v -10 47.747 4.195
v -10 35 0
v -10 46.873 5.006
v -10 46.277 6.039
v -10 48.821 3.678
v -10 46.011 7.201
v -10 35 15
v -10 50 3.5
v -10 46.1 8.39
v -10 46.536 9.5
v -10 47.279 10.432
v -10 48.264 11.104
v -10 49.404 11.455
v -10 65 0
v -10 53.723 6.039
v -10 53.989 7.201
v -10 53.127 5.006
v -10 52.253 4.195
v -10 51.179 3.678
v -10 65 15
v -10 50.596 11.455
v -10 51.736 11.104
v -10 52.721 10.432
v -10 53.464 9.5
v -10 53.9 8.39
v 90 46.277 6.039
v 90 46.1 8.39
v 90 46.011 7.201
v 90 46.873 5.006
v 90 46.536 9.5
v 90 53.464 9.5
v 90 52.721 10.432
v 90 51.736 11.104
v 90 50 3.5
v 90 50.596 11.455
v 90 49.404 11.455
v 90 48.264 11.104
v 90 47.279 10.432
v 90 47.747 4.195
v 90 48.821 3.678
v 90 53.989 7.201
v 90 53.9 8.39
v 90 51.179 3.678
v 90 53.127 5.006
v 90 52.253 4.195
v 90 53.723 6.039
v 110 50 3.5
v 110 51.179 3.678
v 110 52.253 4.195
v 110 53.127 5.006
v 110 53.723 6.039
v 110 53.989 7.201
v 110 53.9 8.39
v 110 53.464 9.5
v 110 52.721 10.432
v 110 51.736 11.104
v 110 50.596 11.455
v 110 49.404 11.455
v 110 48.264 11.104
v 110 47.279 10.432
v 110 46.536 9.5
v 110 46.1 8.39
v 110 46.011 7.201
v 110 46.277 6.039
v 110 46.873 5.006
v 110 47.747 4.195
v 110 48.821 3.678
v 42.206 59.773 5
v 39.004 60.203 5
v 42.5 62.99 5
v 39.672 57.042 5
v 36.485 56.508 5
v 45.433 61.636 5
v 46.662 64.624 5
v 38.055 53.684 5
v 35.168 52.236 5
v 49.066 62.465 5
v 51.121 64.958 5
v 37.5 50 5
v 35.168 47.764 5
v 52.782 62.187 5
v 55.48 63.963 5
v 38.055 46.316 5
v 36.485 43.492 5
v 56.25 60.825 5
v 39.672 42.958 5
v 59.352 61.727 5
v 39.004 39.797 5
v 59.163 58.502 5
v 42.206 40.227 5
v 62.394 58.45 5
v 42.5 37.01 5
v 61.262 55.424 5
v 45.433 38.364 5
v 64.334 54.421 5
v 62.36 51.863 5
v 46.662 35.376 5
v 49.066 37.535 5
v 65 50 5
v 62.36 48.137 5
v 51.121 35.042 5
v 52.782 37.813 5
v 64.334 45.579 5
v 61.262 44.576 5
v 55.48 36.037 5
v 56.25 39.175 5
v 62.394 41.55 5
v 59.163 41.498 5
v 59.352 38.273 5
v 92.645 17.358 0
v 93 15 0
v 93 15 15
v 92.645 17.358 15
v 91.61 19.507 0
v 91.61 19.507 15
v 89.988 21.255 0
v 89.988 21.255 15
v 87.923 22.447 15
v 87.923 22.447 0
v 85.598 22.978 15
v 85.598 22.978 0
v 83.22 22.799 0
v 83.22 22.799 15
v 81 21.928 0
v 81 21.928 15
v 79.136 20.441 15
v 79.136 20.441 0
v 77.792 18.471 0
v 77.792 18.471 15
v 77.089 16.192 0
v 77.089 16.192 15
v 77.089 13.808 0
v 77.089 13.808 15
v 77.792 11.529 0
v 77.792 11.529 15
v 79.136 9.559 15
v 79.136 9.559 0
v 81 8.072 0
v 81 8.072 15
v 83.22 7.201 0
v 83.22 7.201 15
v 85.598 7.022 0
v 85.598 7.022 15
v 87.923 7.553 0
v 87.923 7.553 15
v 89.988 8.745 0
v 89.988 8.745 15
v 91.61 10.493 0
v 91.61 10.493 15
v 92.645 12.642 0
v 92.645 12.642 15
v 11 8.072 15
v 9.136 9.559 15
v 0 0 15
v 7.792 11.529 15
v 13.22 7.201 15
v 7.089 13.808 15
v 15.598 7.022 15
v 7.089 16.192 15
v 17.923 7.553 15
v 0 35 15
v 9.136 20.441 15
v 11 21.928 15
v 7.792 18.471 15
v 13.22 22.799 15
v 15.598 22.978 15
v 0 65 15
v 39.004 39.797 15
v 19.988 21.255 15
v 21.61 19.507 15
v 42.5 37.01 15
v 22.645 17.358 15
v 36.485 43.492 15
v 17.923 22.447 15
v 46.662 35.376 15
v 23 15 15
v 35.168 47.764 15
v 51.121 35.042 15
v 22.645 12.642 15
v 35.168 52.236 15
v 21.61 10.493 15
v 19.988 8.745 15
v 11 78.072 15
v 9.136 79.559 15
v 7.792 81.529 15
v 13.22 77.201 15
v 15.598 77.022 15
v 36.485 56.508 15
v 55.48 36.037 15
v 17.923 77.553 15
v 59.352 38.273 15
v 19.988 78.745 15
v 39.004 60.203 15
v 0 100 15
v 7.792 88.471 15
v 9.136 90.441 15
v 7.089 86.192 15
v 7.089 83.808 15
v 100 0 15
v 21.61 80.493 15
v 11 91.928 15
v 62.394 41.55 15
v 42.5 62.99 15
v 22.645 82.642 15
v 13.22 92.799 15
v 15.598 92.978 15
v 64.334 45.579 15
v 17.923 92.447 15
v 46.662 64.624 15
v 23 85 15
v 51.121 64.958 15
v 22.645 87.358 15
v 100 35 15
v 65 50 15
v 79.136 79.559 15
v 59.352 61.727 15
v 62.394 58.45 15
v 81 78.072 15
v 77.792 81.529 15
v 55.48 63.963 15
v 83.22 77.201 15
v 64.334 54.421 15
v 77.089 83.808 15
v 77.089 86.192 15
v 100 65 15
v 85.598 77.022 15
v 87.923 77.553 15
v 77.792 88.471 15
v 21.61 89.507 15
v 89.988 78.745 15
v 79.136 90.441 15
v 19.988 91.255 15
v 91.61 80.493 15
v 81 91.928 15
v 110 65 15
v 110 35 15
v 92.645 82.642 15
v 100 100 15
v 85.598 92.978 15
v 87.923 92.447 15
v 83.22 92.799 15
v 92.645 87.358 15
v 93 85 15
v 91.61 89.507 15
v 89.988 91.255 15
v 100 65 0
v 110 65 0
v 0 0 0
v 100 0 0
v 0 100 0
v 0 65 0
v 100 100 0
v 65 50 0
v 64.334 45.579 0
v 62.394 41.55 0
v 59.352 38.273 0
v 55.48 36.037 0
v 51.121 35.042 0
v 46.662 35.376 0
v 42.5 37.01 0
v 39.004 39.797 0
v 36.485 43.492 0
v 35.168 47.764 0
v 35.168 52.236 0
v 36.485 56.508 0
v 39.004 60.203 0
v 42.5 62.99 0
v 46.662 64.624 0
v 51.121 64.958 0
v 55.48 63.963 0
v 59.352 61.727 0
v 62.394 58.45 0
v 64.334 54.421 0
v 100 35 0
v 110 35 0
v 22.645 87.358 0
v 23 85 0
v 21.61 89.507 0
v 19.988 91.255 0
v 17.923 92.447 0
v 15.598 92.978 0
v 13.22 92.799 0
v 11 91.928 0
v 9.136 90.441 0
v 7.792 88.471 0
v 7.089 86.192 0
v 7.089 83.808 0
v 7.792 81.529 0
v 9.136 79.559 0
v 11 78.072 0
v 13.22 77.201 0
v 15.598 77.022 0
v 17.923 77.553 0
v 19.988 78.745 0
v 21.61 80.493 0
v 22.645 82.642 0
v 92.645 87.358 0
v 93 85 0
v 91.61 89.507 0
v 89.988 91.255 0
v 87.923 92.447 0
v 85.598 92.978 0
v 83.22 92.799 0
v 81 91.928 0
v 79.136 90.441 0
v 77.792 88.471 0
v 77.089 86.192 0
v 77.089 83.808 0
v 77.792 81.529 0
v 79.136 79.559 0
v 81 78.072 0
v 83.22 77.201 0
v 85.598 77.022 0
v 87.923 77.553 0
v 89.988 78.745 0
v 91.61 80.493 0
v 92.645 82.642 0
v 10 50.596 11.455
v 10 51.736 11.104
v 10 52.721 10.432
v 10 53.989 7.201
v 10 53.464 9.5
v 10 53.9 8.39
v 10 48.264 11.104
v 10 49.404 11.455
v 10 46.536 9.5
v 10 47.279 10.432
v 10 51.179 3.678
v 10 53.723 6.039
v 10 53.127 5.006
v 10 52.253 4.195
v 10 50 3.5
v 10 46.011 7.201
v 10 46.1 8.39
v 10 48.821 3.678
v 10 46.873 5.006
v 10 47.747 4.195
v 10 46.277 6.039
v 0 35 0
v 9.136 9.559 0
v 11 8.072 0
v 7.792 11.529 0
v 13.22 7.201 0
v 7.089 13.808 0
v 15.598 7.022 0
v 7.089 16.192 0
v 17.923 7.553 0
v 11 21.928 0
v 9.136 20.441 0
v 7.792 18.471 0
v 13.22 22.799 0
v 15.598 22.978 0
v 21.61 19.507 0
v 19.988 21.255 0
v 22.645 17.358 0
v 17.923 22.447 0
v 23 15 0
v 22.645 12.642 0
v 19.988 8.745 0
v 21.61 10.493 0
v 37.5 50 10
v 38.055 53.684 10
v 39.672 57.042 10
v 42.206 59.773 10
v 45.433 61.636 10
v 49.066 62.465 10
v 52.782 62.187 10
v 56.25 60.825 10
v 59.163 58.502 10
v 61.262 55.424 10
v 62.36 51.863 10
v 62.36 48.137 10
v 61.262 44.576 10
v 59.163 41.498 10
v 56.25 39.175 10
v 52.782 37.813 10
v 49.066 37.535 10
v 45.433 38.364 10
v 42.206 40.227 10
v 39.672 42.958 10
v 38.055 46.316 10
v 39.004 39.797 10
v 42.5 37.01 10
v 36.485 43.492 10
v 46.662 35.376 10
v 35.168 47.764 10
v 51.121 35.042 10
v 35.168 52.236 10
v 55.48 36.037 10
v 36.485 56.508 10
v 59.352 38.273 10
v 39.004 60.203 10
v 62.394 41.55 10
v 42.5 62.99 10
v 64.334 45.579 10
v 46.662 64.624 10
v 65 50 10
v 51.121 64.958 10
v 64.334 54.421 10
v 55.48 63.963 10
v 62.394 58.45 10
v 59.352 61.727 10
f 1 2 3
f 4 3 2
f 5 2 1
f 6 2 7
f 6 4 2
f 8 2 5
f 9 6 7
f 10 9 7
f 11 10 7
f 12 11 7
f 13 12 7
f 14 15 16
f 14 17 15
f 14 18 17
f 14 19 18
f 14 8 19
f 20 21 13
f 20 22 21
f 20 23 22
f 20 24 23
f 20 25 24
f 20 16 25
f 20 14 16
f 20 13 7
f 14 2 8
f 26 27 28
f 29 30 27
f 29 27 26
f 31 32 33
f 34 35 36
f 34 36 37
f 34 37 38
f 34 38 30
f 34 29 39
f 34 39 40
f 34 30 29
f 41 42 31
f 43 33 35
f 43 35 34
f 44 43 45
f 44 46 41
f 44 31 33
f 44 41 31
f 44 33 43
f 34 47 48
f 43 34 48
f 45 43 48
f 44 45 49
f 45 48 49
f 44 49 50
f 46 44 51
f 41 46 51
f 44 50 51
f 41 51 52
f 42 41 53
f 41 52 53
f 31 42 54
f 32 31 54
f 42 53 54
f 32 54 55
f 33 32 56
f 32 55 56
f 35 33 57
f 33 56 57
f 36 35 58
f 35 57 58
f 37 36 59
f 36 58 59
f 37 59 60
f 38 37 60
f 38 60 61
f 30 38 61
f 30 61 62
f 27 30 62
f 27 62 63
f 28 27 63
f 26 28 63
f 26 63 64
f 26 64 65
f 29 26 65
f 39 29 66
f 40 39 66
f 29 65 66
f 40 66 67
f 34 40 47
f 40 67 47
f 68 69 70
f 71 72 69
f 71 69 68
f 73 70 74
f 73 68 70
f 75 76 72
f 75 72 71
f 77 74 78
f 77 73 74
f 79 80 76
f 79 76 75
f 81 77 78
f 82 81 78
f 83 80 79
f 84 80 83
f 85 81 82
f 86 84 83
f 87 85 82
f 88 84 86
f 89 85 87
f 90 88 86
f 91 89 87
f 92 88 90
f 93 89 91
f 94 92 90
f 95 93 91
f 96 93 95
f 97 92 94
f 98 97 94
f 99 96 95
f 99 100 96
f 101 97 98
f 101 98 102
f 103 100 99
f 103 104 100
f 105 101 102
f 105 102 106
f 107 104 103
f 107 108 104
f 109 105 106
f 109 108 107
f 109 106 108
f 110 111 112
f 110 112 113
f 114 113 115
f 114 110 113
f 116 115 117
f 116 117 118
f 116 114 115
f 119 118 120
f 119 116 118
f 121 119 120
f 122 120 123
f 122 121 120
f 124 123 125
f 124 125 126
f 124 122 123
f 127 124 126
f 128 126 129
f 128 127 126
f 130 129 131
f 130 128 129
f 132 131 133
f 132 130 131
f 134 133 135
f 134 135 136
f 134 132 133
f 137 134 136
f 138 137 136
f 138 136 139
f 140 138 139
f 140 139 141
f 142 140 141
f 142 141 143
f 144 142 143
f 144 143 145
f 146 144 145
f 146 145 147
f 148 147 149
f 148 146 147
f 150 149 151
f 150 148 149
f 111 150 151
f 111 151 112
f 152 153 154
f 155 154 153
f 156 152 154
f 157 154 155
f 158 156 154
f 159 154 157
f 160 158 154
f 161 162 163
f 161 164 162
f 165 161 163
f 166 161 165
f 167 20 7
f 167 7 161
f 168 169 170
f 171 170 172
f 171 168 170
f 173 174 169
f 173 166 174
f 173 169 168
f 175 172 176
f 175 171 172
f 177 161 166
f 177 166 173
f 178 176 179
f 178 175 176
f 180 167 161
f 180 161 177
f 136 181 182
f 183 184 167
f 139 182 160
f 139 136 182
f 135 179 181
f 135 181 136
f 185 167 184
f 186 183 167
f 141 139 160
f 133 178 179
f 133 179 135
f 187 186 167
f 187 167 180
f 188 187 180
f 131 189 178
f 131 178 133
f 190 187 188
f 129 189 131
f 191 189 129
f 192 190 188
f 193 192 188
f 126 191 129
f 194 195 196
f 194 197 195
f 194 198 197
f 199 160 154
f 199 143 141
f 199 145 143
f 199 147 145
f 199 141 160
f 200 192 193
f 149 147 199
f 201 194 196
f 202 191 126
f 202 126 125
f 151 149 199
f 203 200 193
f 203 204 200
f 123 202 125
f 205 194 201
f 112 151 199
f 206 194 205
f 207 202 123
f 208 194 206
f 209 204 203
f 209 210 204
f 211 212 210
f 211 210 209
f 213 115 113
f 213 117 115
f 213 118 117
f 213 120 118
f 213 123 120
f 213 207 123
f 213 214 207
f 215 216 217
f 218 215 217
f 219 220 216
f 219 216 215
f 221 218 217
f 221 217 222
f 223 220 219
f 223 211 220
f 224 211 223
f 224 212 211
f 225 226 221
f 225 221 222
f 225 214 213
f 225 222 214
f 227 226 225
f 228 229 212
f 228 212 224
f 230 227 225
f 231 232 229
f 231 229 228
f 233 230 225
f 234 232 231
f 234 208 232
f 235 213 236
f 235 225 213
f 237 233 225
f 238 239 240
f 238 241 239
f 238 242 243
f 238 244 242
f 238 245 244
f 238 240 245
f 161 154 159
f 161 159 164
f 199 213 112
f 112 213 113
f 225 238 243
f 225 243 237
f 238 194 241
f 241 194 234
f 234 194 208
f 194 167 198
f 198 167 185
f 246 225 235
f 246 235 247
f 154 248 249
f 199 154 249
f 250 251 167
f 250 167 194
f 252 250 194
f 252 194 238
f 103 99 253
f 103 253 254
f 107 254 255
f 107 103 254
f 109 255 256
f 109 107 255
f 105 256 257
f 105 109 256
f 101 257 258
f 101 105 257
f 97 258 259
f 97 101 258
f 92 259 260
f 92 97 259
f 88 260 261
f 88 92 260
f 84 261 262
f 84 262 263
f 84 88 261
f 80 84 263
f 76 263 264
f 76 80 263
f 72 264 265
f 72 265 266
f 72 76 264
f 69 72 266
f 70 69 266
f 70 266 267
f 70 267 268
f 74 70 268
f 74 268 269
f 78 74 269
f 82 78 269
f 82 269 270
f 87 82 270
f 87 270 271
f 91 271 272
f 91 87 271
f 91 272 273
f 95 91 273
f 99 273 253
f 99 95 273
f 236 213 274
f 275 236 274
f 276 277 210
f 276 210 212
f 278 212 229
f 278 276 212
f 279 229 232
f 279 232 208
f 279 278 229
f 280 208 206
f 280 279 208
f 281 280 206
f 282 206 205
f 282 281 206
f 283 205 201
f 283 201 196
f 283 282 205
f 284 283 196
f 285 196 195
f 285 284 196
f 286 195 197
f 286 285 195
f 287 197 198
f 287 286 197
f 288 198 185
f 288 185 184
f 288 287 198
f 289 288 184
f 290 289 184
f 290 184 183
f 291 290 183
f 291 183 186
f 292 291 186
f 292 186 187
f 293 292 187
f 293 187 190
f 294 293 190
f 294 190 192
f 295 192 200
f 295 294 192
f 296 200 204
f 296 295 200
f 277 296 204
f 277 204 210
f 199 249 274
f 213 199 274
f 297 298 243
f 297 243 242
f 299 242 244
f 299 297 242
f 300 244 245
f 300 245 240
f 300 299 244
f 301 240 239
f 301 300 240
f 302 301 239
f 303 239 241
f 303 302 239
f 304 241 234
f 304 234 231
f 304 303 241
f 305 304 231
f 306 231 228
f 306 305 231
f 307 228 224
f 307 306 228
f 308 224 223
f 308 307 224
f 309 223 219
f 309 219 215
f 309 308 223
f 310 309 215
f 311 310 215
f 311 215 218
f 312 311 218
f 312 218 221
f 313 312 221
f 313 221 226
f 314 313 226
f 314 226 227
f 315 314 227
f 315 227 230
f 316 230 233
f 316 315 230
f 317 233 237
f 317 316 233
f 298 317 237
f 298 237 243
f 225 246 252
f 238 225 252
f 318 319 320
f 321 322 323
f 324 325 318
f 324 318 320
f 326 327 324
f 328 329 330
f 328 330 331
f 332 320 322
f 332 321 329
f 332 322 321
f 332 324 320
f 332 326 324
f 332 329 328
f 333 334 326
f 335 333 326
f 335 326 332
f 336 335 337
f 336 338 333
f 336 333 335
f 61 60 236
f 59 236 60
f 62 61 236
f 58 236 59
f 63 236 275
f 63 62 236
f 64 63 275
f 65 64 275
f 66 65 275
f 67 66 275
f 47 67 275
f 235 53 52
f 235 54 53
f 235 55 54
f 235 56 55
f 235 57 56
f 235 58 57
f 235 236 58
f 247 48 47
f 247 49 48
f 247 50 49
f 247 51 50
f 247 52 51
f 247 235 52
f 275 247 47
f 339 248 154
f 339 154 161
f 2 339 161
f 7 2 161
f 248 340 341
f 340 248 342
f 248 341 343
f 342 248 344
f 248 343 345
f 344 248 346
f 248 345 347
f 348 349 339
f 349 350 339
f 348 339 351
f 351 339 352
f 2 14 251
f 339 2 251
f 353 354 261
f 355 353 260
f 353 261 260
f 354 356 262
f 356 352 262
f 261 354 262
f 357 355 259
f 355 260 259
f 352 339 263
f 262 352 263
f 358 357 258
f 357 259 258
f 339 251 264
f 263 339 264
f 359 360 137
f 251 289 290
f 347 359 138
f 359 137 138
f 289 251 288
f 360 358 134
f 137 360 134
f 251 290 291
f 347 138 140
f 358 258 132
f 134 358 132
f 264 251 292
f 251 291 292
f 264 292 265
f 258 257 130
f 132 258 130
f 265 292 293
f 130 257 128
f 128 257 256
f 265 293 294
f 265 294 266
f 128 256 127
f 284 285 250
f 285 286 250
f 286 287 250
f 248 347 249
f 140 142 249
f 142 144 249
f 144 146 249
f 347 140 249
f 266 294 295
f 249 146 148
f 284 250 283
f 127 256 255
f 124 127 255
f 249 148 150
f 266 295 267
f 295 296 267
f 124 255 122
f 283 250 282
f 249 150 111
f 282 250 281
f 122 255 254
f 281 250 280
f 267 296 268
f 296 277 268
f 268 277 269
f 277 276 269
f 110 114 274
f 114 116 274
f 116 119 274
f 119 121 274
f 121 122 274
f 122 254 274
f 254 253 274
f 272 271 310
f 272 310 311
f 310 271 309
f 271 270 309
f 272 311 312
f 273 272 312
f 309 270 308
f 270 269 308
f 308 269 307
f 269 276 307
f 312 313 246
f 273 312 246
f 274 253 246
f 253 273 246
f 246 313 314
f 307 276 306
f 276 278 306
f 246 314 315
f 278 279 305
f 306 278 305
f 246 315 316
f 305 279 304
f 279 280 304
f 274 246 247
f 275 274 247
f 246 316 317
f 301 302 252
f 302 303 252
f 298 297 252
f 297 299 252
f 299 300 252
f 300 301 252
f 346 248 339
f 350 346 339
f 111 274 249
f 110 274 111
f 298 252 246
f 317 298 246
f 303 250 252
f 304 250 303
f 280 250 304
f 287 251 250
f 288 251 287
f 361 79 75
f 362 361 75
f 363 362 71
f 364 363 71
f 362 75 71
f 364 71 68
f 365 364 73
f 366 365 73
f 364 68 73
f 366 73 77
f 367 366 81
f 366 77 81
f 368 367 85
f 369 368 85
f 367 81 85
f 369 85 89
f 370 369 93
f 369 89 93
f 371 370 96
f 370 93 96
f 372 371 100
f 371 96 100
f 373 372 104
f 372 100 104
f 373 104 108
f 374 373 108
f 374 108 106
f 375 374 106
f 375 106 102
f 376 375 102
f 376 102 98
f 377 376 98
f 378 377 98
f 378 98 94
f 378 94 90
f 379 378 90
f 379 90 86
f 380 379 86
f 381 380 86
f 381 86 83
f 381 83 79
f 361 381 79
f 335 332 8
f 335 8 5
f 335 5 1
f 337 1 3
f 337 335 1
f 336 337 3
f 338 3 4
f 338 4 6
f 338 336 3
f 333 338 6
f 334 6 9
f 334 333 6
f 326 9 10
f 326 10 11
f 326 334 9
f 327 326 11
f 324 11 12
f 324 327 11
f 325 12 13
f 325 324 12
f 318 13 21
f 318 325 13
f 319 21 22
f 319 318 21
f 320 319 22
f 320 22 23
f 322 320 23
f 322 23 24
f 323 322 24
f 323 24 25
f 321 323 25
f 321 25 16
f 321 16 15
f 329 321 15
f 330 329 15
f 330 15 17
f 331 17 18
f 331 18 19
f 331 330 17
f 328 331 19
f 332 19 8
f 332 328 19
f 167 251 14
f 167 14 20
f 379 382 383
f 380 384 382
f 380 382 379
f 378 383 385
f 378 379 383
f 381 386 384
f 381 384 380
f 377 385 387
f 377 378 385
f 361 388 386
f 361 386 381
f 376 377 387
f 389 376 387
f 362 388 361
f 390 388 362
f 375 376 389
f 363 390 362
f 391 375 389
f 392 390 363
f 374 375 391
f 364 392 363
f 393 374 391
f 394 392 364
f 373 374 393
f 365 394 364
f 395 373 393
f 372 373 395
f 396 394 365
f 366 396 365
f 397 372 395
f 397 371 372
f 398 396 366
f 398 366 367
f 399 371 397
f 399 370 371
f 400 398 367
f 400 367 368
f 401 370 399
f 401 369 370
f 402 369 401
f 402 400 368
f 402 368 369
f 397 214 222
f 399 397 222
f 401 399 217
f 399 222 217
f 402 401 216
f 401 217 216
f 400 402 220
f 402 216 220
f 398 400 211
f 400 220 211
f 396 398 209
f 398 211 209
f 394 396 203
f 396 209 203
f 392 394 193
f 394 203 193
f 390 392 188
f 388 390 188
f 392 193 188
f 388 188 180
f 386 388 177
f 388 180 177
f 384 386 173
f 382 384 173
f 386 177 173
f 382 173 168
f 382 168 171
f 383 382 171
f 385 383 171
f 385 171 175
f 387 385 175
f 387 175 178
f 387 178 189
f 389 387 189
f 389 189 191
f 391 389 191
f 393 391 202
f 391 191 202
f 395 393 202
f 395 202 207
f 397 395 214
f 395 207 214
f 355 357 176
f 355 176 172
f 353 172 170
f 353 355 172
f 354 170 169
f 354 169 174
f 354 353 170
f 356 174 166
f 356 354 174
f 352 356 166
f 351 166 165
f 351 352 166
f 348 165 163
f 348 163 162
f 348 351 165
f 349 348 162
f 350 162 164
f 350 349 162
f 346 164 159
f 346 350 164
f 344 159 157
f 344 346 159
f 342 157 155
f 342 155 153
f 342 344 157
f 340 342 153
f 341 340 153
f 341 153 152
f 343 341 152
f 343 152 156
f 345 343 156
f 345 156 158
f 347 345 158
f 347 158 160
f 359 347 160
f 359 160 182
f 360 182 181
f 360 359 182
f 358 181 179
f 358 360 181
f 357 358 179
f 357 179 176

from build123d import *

# Parameters (mm, degrees)
SKETCH1_W           = 100
SKETCH1_H           = 100
SKETCH1_R           = 8
BOSS_EXTRUDE1_DEPTH = 15
SKETCH4_W           = 15
SKETCH4_H           = 30
BOSS_EXTRUDE2_DEPTH = 10
SKETCH7_W           = 15
SKETCH7_H           = 30
BOSS_EXTRUDE3_DEPTH = 10
SKETCH8_R           = 15
CUT_EXTRUDE1_DEPTH  = 5
CUT_EXTRUDE2_START  = -5
SKETCH10_R          = 15
CUT_EXTRUDE2_DEPTH  = 5
SKETCH11_R          = 12.5
CUT_EXTRUDE5_DEPTH  = 150.415527975
SKETCH12_R          = 4
CUT_EXTRUDE6_DEPTH  = 20
CUT_EXTRUDE7_START  = -20
SKETCH13_R          = 4
CUT_EXTRUDE7_DEPTH  = 20


with BuildPart() as part:
    # Sketch1 → Boss-Extrude1 (new body)
    with BuildSketch(Plane.XY):
        with Locations((50, 50)):
            Rectangle(SKETCH1_W, SKETCH1_H)
        with Locations((15, 85)):
            Circle(SKETCH1_R, mode=Mode.SUBTRACT)
        with Locations((85, 85)):
            Circle(SKETCH1_R, mode=Mode.SUBTRACT)
        with Locations((85, 15)):
            Circle(SKETCH1_R, mode=Mode.SUBTRACT)
        with Locations((15, 15)):
            Circle(SKETCH1_R, mode=Mode.SUBTRACT)
    extrude(amount=BOSS_EXTRUDE1_DEPTH)

    # Sketch4 → Boss-Extrude2 (add)
    with BuildSketch(Plane(origin=(100, 0, 0), x_dir=(0, 0, -1), z_dir=(1, 0, 0))):
        with Locations((-7.5, 50)):
            Rectangle(SKETCH4_W, SKETCH4_H)
    extrude(amount=BOSS_EXTRUDE2_DEPTH)

    # Sketch7 → Boss-Extrude3 (add)
    with BuildSketch(Plane.ZY):
        with Locations((7.5, 50)):
            Rectangle(SKETCH7_W, SKETCH7_H)
    extrude(amount=BOSS_EXTRUDE3_DEPTH)

    # Sketch8 → Cut-Extrude1 (cut)
    with BuildSketch(Plane.XY.offset(15)):
        with Locations((50, 50)):
            Circle(SKETCH8_R)
    extrude(amount=-CUT_EXTRUDE1_DEPTH, mode=Mode.SUBTRACT)

    # Sketch10 → Cut-Extrude2 (cut)
    with BuildSketch(Plane(origin=(0, 0, 0), x_dir=(-1, 0, 0), z_dir=(0, 0, -1)).offset(CUT_EXTRUDE2_START)):
        with Locations(Location((-50, 50, 0), (0, 0, 180))):
            Circle(SKETCH10_R)
    extrude(amount=CUT_EXTRUDE2_DEPTH, mode=Mode.SUBTRACT)

    # Sketch11 → Cut-Extrude5 (cut, through all)
    with BuildSketch(Plane(origin=(0, 0, 0), x_dir=(-1, 0, 0), z_dir=(0, 0, -1))):
        with Locations((-50, 50)):
            Circle(SKETCH11_R)
    extrude(amount=-CUT_EXTRUDE5_DEPTH, mode=Mode.SUBTRACT)

    # Sketch12 → Cut-Extrude6 (cut)
    with BuildSketch(Plane(origin=(110, 0, 0), x_dir=(0, 0, -1), z_dir=(1, 0, 0))):
        with Locations((-7.5, 50)):
            Circle(SKETCH12_R)
    extrude(amount=-CUT_EXTRUDE6_DEPTH, mode=Mode.SUBTRACT)

    # Sketch13 → Cut-Extrude7 (cut)
    with BuildSketch(Plane.ZY.offset(10).offset(CUT_EXTRUDE7_START)):
        with Locations(Location((7.5, 50, 0), (0, 0, 180))):
            Circle(SKETCH13_R)
    extrude(amount=CUT_EXTRUDE7_DEPTH, mode=Mode.SUBTRACT)


solid = part.part
